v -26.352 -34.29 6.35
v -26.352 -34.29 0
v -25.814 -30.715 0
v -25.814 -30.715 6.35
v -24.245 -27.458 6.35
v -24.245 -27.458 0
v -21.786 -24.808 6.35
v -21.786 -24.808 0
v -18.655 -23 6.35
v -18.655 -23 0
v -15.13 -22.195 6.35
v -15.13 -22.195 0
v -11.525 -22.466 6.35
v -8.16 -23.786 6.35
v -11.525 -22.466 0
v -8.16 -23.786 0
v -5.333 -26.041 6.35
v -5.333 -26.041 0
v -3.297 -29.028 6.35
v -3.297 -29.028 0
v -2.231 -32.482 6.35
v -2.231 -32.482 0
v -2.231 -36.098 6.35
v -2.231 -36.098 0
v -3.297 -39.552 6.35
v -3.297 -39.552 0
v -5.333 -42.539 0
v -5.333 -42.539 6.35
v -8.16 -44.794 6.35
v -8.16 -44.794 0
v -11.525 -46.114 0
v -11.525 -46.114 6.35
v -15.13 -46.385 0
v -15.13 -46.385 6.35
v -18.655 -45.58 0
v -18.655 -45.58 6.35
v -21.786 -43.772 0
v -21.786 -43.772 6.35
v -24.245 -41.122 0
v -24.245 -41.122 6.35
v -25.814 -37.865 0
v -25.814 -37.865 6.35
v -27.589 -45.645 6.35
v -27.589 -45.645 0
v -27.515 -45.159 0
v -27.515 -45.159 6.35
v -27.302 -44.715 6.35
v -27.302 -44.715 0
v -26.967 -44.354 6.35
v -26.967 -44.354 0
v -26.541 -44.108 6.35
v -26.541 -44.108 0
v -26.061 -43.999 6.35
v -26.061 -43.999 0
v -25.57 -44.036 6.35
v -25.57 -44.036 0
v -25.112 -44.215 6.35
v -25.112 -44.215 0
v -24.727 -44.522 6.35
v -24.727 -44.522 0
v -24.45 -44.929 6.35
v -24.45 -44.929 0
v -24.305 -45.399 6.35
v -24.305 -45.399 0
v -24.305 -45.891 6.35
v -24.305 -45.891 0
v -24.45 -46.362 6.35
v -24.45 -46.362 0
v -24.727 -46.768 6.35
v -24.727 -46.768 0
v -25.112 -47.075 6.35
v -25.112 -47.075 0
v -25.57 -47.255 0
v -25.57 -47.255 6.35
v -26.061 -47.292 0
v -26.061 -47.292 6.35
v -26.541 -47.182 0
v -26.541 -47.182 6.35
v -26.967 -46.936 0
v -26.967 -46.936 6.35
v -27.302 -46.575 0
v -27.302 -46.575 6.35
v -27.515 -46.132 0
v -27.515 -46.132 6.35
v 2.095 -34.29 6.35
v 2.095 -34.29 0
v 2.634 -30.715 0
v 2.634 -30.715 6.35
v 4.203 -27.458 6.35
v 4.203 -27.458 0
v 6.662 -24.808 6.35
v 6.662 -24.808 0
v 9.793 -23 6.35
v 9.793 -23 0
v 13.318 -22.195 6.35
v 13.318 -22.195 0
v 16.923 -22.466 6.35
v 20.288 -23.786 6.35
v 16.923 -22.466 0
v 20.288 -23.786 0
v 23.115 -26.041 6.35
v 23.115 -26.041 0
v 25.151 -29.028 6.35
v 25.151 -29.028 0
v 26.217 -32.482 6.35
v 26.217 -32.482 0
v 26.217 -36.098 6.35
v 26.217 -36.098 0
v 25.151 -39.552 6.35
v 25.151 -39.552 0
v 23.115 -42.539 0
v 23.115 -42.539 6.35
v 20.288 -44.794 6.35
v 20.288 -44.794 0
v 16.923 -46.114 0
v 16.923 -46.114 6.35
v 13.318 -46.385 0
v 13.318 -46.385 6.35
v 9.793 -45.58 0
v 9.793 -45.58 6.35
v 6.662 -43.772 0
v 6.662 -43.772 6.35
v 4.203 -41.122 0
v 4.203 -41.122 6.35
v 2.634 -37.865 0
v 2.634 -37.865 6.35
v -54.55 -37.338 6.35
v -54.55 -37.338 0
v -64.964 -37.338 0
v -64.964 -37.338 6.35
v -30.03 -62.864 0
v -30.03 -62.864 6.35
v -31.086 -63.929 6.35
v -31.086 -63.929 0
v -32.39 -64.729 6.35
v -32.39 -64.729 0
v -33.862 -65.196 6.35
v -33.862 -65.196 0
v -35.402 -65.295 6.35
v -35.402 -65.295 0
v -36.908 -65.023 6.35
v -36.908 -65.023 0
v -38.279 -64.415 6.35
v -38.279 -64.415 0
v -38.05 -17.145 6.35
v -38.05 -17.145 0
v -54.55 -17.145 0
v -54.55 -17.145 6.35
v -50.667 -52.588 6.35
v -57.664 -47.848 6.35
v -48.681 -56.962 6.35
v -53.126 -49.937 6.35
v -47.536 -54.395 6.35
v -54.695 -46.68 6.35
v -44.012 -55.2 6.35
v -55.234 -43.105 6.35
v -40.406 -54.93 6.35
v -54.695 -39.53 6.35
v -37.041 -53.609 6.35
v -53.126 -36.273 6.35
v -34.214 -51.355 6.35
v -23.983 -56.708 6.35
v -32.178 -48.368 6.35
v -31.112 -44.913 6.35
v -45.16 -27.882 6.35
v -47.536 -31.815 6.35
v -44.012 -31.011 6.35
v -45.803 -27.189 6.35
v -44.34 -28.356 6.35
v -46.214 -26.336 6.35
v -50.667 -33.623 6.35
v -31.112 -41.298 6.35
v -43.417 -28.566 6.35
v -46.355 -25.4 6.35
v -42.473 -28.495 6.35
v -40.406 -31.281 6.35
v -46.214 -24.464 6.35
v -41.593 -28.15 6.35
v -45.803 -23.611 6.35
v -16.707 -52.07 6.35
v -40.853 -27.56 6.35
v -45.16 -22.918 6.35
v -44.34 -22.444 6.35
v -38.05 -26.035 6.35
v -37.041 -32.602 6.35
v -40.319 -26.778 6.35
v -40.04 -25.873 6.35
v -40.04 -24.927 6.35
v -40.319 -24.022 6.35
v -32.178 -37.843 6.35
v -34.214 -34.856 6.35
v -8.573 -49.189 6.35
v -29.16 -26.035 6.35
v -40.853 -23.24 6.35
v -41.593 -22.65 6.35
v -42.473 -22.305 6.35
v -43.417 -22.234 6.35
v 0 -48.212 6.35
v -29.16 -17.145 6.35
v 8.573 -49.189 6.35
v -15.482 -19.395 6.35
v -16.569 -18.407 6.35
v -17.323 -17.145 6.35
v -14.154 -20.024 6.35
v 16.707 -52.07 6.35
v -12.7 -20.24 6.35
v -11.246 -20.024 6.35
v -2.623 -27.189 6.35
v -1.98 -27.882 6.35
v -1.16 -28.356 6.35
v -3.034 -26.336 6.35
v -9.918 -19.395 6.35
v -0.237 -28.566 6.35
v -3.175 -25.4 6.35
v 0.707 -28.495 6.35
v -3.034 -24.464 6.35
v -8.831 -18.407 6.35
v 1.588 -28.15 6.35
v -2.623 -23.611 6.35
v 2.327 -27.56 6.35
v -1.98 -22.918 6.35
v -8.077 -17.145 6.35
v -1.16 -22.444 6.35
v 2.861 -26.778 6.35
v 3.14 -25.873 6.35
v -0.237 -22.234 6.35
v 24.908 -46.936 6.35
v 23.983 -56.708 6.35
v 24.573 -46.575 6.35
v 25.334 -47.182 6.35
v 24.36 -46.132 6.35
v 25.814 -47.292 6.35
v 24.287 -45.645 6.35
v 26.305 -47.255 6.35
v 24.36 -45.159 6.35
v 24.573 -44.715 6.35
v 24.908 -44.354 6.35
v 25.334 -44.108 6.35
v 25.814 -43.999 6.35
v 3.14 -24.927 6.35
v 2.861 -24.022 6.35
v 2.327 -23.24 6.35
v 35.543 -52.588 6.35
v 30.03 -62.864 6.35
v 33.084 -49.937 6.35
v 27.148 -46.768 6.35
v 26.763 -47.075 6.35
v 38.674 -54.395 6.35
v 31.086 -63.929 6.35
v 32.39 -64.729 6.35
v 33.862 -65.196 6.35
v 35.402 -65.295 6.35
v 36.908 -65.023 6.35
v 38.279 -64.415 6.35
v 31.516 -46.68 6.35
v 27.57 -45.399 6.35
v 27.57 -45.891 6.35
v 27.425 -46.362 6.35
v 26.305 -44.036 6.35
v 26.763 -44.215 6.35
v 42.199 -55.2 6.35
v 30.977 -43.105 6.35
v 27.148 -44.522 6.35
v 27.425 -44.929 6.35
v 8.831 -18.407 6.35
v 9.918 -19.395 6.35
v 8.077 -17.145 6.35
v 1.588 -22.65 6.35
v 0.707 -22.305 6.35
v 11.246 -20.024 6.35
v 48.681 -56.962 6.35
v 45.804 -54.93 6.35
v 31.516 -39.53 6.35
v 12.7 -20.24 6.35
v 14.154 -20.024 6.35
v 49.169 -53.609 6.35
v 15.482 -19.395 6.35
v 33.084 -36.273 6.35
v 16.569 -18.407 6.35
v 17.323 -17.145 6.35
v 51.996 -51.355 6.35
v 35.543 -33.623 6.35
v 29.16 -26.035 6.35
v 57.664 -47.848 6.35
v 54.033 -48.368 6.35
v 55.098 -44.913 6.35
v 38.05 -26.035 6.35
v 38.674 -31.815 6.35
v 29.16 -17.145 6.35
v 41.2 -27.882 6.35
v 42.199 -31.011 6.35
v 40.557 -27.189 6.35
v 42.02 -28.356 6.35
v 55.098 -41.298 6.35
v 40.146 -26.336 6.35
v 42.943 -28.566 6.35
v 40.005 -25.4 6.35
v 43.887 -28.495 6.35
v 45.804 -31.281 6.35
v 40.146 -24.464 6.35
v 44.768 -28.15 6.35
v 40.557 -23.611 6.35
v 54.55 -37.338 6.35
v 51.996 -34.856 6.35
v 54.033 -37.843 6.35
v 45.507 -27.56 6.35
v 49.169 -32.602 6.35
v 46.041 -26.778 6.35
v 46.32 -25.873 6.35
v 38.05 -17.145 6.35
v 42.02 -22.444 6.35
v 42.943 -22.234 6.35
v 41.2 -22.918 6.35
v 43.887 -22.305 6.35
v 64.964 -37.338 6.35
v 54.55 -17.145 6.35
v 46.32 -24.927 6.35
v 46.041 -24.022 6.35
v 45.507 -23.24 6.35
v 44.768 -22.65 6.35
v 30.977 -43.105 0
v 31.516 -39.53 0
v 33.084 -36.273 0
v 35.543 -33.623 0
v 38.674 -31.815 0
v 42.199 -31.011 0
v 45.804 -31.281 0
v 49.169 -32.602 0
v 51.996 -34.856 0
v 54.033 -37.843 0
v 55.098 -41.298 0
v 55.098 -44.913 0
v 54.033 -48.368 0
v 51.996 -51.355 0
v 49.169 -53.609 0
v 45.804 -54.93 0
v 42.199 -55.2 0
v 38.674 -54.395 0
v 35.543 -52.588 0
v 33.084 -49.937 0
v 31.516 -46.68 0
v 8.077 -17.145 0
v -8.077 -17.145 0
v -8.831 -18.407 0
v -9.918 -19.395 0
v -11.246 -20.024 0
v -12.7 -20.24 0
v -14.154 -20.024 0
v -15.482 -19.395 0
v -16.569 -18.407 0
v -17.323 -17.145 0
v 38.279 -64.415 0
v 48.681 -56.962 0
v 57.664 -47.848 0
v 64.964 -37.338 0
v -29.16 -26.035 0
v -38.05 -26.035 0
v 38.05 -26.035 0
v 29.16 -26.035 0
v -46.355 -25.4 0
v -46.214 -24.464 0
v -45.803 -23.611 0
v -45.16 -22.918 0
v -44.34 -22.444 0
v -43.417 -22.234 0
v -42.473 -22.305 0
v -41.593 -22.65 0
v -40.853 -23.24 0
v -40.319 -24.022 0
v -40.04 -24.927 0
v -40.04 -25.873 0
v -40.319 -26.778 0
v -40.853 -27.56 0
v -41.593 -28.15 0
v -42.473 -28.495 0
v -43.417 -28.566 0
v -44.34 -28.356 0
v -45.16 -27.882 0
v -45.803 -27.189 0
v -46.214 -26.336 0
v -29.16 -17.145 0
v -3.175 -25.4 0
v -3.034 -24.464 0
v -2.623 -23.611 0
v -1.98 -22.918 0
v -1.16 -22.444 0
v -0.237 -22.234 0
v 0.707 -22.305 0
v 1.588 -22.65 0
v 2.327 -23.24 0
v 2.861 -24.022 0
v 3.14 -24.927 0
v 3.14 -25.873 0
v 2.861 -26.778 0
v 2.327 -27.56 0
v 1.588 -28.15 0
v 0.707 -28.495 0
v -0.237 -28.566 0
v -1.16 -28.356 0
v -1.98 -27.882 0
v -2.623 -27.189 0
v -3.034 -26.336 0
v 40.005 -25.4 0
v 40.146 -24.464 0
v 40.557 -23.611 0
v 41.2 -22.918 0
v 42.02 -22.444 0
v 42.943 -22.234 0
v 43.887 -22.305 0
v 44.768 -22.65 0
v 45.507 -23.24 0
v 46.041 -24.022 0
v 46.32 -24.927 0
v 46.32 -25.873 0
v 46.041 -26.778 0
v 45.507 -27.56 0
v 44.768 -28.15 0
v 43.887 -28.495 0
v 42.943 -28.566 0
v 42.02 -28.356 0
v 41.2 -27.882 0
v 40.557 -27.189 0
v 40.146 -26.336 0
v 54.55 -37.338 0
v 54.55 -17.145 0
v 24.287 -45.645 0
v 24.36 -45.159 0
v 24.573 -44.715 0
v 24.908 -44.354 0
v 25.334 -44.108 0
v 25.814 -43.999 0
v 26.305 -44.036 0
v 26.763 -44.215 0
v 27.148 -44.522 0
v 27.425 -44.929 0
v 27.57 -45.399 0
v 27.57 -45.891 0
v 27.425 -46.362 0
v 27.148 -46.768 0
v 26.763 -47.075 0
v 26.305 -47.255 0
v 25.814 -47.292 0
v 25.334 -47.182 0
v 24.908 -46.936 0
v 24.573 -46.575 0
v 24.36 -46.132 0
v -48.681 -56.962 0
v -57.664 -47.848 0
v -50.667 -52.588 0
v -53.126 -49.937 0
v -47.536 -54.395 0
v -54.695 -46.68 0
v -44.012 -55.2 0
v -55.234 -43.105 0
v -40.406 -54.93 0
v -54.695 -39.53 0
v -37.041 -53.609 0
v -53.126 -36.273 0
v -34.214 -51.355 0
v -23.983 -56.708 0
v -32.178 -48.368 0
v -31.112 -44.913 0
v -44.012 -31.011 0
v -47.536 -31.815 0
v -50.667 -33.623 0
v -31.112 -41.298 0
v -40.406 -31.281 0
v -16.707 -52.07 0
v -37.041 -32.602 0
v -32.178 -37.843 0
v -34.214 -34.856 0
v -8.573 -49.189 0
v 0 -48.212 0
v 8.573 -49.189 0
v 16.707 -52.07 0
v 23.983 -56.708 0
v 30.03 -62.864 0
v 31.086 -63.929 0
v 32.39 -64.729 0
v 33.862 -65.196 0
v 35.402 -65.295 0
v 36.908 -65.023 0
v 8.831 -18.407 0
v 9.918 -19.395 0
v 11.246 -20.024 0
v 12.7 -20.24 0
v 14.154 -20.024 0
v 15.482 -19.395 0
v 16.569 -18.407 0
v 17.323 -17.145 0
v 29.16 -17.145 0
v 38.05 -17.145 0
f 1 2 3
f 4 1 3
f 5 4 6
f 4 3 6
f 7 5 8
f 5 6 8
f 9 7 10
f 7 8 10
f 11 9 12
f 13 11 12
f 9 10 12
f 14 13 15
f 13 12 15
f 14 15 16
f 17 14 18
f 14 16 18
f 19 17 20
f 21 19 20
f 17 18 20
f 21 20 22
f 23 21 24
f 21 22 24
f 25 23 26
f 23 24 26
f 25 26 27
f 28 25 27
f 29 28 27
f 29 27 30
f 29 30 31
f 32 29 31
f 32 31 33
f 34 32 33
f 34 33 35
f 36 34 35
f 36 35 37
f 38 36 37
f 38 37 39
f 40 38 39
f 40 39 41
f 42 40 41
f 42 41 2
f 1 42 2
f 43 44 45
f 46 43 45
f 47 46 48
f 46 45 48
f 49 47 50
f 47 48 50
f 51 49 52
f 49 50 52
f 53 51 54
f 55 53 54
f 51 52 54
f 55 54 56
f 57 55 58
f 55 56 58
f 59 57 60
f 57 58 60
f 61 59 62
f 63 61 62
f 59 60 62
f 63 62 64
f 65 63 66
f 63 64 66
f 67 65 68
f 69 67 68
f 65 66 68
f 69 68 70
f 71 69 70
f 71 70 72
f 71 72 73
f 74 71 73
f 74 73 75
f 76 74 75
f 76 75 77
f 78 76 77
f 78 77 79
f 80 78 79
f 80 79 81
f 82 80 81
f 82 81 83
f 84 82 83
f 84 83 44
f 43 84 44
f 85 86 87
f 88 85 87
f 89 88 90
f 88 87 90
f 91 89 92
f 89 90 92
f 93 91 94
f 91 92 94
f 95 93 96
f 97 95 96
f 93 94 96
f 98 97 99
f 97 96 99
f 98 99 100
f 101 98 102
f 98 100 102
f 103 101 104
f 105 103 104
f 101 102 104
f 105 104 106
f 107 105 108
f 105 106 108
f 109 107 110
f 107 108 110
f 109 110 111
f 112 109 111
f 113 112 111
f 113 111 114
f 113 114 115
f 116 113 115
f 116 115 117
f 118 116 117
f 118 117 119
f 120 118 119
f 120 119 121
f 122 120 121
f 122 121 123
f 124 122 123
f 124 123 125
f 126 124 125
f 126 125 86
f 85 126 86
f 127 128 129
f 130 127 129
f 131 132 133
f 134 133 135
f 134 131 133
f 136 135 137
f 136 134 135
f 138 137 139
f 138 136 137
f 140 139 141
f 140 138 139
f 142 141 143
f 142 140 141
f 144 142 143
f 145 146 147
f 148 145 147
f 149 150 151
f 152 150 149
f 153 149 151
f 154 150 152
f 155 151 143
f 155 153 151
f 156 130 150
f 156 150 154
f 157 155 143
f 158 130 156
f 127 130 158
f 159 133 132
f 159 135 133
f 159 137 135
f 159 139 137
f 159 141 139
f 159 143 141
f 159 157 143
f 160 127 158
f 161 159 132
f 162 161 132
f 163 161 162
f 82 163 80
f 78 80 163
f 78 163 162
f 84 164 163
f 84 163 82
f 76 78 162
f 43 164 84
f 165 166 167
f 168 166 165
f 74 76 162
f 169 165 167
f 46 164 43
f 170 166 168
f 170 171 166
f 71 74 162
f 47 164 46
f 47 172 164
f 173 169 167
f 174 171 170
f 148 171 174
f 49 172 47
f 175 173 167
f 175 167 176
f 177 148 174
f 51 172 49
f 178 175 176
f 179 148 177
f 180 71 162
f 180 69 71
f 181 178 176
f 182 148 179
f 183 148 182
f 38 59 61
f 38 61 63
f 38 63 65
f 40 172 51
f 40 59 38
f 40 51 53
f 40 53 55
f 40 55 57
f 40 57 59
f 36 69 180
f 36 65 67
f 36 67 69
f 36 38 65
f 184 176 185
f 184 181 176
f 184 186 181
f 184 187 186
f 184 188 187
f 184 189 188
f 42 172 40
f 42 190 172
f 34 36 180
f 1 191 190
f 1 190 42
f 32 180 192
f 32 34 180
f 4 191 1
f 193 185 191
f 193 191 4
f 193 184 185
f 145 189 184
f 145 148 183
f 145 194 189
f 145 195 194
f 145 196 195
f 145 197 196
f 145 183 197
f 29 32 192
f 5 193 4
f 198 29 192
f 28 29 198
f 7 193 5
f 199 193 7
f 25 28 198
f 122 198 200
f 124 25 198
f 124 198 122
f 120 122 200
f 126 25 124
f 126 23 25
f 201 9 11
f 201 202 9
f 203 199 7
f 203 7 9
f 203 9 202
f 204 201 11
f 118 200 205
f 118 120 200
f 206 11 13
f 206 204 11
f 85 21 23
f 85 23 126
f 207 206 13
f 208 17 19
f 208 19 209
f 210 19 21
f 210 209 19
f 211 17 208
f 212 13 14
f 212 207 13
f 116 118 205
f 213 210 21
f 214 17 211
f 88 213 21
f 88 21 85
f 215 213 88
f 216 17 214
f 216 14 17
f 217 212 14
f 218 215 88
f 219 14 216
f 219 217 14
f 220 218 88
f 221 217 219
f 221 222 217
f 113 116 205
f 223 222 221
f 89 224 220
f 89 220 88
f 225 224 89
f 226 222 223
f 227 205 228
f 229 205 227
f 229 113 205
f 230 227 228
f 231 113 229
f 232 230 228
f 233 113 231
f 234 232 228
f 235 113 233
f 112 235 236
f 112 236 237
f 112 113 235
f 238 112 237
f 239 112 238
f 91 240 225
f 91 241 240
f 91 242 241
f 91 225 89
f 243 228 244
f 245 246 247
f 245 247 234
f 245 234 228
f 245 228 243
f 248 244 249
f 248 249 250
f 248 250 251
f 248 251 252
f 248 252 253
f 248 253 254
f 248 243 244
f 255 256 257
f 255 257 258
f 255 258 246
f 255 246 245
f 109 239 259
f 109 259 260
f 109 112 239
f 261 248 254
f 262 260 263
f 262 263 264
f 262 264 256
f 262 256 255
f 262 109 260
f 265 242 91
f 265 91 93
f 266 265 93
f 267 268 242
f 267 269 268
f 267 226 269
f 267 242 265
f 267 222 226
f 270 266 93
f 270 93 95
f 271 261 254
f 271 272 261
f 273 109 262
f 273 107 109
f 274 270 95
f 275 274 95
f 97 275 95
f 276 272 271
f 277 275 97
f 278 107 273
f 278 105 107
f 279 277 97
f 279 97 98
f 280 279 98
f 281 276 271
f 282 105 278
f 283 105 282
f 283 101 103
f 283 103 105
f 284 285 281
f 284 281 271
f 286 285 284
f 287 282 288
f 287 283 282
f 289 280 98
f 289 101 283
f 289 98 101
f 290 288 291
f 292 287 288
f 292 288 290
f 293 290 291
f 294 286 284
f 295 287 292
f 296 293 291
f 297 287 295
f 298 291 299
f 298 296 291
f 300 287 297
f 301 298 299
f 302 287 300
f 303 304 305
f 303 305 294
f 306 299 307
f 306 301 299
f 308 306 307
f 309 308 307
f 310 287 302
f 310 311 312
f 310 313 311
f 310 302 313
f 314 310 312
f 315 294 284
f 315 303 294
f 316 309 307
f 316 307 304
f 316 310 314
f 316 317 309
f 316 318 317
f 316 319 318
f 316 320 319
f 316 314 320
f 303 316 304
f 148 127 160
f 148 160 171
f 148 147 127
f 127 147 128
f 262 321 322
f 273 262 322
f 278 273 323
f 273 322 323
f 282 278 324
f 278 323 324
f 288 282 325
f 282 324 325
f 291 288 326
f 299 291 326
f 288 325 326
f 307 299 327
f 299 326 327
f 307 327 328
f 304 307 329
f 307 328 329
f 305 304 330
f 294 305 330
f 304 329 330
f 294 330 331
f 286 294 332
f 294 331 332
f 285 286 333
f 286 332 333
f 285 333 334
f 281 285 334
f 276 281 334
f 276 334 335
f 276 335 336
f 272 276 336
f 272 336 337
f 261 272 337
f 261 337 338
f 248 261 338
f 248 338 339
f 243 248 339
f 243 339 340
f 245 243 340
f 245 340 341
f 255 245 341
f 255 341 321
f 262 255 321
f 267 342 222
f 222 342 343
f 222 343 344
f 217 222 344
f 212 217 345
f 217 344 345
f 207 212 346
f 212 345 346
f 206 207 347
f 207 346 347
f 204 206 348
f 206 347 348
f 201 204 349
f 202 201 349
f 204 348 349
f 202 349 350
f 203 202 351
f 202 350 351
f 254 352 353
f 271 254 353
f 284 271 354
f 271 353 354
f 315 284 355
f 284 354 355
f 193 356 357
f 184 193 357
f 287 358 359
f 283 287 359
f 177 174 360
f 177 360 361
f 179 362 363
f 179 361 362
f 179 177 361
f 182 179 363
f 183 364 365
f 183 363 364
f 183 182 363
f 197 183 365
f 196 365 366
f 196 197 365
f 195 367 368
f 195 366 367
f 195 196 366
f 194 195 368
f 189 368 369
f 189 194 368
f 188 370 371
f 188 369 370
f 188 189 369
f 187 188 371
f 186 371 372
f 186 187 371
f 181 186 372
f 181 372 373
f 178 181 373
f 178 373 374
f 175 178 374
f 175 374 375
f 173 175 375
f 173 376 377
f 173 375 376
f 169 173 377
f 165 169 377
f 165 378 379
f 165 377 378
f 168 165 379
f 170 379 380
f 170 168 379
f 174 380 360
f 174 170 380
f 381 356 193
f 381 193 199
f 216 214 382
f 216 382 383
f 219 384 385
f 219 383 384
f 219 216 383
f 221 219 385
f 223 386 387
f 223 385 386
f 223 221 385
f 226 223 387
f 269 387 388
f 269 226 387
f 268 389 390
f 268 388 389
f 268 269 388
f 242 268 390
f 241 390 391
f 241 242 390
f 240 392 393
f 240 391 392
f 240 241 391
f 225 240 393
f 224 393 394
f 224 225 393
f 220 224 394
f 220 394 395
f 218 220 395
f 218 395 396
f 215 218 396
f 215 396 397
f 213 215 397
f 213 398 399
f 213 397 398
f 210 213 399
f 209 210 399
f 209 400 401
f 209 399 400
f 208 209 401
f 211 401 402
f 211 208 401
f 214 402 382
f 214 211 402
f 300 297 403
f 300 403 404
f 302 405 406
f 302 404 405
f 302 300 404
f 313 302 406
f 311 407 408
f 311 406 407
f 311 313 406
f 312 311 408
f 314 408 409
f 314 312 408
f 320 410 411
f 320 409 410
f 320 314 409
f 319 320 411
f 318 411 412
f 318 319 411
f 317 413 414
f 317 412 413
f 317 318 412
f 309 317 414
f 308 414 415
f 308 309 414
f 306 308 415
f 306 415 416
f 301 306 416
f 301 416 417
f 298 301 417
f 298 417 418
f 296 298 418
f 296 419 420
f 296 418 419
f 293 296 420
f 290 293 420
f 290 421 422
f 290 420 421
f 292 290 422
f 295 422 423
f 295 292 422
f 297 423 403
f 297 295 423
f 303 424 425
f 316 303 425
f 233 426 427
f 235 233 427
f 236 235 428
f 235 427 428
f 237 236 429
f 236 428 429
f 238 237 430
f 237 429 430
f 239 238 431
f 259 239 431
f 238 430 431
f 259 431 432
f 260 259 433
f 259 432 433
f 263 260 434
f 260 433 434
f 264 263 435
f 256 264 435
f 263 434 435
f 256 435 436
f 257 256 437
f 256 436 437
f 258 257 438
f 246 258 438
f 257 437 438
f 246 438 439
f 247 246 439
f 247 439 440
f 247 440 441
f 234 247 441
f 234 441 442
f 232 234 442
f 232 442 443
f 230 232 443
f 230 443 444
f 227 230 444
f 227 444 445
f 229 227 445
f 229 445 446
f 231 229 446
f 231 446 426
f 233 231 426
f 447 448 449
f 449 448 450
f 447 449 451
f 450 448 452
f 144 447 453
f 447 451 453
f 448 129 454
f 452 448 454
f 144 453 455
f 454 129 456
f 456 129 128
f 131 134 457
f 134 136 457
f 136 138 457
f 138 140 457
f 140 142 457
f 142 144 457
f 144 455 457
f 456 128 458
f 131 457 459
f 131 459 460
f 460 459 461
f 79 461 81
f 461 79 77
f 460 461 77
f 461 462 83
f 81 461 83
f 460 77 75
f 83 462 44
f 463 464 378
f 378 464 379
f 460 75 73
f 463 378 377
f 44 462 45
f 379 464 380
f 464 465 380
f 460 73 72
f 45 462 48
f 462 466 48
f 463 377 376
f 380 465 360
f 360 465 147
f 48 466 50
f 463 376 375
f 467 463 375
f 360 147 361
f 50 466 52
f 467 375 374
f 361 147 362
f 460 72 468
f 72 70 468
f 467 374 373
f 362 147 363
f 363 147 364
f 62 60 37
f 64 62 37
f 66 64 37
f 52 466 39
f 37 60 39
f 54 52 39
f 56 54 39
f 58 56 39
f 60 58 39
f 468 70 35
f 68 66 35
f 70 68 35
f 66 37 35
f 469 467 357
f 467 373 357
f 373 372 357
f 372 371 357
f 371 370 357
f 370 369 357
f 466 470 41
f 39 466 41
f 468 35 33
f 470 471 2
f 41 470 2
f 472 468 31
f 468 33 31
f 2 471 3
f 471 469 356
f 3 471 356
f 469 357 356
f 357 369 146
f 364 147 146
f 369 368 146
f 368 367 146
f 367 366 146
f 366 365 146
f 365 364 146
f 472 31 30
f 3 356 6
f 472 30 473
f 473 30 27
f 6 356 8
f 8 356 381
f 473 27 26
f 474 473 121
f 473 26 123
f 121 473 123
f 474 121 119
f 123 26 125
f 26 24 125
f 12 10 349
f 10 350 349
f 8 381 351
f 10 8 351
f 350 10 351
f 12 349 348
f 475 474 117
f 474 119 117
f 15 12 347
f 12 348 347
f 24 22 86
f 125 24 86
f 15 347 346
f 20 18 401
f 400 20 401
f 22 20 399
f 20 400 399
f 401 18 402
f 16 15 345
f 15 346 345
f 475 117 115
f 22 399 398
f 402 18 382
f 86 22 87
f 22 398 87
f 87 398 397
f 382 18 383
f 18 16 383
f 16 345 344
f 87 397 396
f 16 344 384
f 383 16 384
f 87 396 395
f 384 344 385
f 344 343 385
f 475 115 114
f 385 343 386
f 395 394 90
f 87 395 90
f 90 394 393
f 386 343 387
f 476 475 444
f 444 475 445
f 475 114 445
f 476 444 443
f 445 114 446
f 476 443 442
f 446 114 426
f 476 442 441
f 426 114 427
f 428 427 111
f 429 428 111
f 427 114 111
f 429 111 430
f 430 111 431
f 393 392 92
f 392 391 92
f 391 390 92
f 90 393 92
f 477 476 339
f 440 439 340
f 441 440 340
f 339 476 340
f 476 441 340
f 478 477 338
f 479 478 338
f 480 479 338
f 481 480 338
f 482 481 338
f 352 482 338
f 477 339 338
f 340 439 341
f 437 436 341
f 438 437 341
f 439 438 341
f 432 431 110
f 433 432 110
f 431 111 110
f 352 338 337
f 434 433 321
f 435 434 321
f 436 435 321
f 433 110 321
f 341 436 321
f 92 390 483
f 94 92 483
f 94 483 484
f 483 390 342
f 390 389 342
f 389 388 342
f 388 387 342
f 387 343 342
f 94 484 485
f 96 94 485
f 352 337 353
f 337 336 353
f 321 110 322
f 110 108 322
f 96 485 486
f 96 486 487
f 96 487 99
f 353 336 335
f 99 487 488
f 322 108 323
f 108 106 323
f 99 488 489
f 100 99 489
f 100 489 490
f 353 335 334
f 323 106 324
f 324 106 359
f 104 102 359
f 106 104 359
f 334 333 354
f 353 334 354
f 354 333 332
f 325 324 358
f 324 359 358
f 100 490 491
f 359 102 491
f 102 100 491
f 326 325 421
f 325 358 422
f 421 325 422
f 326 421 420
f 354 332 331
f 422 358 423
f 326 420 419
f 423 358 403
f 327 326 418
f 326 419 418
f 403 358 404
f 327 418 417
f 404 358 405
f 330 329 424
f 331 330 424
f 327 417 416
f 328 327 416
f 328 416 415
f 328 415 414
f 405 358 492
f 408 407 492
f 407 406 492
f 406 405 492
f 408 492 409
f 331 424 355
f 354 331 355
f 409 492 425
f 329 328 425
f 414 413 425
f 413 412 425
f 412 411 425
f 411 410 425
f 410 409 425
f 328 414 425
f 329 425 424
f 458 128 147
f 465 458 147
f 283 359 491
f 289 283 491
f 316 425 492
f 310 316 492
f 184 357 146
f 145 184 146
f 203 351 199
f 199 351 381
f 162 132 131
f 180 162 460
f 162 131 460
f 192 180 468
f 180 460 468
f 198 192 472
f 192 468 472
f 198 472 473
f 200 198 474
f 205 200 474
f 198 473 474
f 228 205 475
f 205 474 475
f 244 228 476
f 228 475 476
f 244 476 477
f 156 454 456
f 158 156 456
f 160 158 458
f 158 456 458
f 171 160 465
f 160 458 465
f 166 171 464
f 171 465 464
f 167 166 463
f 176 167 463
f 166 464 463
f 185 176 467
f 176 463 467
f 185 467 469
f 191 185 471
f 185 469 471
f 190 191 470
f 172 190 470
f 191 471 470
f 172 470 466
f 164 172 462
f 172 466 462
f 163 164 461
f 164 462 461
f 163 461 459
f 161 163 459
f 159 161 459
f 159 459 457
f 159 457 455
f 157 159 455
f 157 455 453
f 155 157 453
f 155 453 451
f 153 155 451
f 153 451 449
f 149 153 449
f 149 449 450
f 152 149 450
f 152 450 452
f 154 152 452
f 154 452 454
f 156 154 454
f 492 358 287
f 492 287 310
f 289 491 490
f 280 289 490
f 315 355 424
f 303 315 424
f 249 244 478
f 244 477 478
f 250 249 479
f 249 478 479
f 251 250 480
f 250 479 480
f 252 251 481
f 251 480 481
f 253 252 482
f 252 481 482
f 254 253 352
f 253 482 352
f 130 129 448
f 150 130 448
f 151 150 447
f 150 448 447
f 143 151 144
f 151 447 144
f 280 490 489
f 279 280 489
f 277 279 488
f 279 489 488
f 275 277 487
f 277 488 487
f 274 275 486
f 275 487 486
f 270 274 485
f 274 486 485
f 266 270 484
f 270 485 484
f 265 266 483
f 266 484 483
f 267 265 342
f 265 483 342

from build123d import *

# Parameters (mm, degrees)
SKETCH1_R                 = 1.651
BOSS_EXTRUDE2_DEPTH       = 6.35
SKETCH2_R                 = 1.143
CUT_EXTRUDE1_DEPTH        = 7.35
SKETCH3_R                 = 12.1285
CUT_EXTRUDE2_DEPTH        = 7.35
SKETCH4_W                 = 28.562713242
SKETCH4_H                 = 11.677503754
BOSS_EXTRUDE3_DEPTH       = 6.35
SKETCH5_W                 = 216.7214489
SKETCH5_H                 = 130.569220634
CUT_EXTRUDE4_DEPTH        = 7.35
SKETCH6_R                 = 38.1
CUT_EXTRUDE5_DEPTH        = 60.96
FILLET1_R                 = 6.35
FILLET2_R                 = 6.35
SKETCH102_W               = 8.89
SKETCH102_H               = 8.89
CUT_EXTRUDE101_DEPTH      = 7.3500001
SKETCH105_R               = 5
CUT_EXTRUDE104_DEPTH      = 10
SKETCH106_R               = 3.175
CUT_EXTRUDE105_DEPTH      = 103.378
CUT_EXTRUDE105_DEPTH_BACK = 1
SKETCH158_R               = 1.651
CUT_EXTRUDE157_DEPTH      = 97.79


with BuildPart() as part:
    # Sketch1 → Boss-Extrude2 (new body)
    with BuildSketch(Plane.XY):
        with BuildLine():
            Line((-64.964441474, 37.338), (-54.550441474, 37.338))
            Line((-54.550441474, 37.338), (-54.550441474, -37.338))
            Line((-54.550441474, -37.338), (-64.964441474, -37.338))
            ThreePointArc((-64.964441474, -37.338), (0, -74.93), (64.964441474, -37.338))
            Line((64.964441474, -37.338), (54.550441474, -37.338))
            Line((54.550441474, -37.338), (54.550441474, 37.338))
            Line((54.550441474, 37.338), (64.964441474, 37.338))
            ThreePointArc((64.964441474, 37.338), (0, 74.93), (-64.964441474, 37.338))
        make_face()
        with Locations((-46.482, 11.049)):
            Circle(SKETCH1_R, mode=Mode.SUBTRACT)
        with Locations((-21.083270032, 10.795)):
            Circle(SKETCH1_R, mode=Mode.SUBTRACT)
        with Locations((-21.083270032, -10.795)):
            Circle(SKETCH1_R, mode=Mode.SUBTRACT)
        with Locations((-46.482, -11.049)):
            Circle(SKETCH1_R, mode=Mode.SUBTRACT)
        with Locations((46.482, -11.049)):
            Circle(SKETCH1_R, mode=Mode.SUBTRACT)
        with Locations((21.083270032, -10.795)):
            Circle(SKETCH1_R, mode=Mode.SUBTRACT)
        with Locations((21.083270032, 10.795)):
            Circle(SKETCH1_R, mode=Mode.SUBTRACT)
        with Locations((46.482, 11.049)):
            Circle(SKETCH1_R, mode=Mode.SUBTRACT)
    extrude(amount=BOSS_EXTRUDE2_DEPTH)

    # Sketch2 → Cut-Extrude1 (cut, through all)
    with BuildSketch(Plane.XY.offset(6.35)):
        with Locations((-6.731, 62.23)):
            Circle(SKETCH2_R)
        with Locations((6.731, 62.23)):
            Circle(SKETCH2_R)
    extrude(amount=-CUT_EXTRUDE1_DEPTH, mode=Mode.SUBTRACT)

    # Sketch3 → Cut-Extrude2 (cut, through all)
    with BuildSketch(Plane(origin=(0, 0, 0), x_dir=(-1, 0, 0), z_dir=(0, 0, -1))):
        with Locations((-43.105229381, -43.105229381)):
            Circle(SKETCH3_R)
        with Locations((14.224, -34.29)):
            Circle(SKETCH3_R)
        with Locations((14.224, 34.29)):
            Circle(SKETCH3_R)
        with Locations((-43.105229381, 43.105229381)):
            Circle(SKETCH3_R)
        with Locations((43.105229381, 43.105229381)):
            Circle(SKETCH3_R)
        with Locations((-14.224, 34.29)):
            Circle(SKETCH3_R)
        with Locations((-14.224, -34.29)):
            Circle(SKETCH3_R)
        with Locations((43.105229381, -43.105229381)):
            Circle(SKETCH3_R)
    extrude(amount=-CUT_EXTRUDE2_DEPTH, mode=Mode.SUBTRACT)

    # Sketch4 → Boss-Extrude3 (add)
    with BuildSketch(Plane(origin=(0, 0, 0), x_dir=(-1, 0, 0), z_dir=(0, 0, -1))):
        with Locations((-1.488809975, 62.152540216)):
            Rectangle(SKETCH4_W, SKETCH4_H)
    extrude(amount=-BOSS_EXTRUDE3_DEPTH)

    # Sketch5 → Cut-Extrude4 (cut, through all)
    with BuildSketch(Plane(origin=(0, 0, 0), x_dir=(-1, 0, 0), z_dir=(0, 0, -1))):
        with Locations((23.316688373, 48.139610317)):
            Rectangle(SKETCH5_W, SKETCH5_H)
    extrude(amount=-CUT_EXTRUDE4_DEPTH, mode=Mode.SUBTRACT)

    # Sketch6 → Cut-Extrude5 (cut)
    with BuildSketch(Plane(origin=(0, 0, 0), x_dir=(-1, 0, 0), z_dir=(0, 0, -1))):
        with Locations((0, -86.312058398)):
            Circle(SKETCH6_R)
    extrude(amount=-CUT_EXTRUDE5_DEPTH, mode=Mode.SUBTRACT)

    # Fillet1
    fillet1_edges = [part.edges().sort_by_distance(p)[0] for p in [
        (-33.000960548, -67.271401821, 3.175),
    ]]
    fillet(fillet1_edges, radius=FILLET1_R)

    # Fillet2
    fillet2_edges = [part.edges().sort_by_distance(p)[0] for p in [
        (33.000960548, -67.271401821, 3.175),
    ]]
    fillet(fillet2_edges, radius=FILLET2_R)

    # Sketch102 → Cut-Extrude101 (cut, through all)
    with BuildSketch(Plane(origin=(0, 0, 0), x_dir=(-1, 0, 0), z_dir=(0, 0, -1))):
        with Locations((-33.605441474, -21.59)):
            Rectangle(SKETCH102_W, SKETCH102_H)
        with Locations((33.605441474, -21.59)):
            Rectangle(SKETCH102_W, SKETCH102_H)
    extrude(amount=-CUT_EXTRUDE101_DEPTH, mode=Mode.SUBTRACT)

    # Sketch105 → Cut-Extrude104 (cut)
    with BuildSketch(Plane(origin=(0, 0, 0), x_dir=(-1, 0, 0), z_dir=(0, 0, -1))):
        with Locations((-12.7, -15.24)):
            Circle(SKETCH105_R)
        with Locations((12.7, -15.24)):
            Circle(SKETCH105_R)
    extrude(amount=-CUT_EXTRUDE104_DEPTH, mode=Mode.SUBTRACT)

    # Sketch106 → Cut-Extrude105 (cut, two sides)
    with BuildSketch(Plane(origin=(30.092005081, 4.08352975, 25.4), x_dir=(-1, 0, 0), z_dir=(0, 0, -1))) as cut_extrude105_sk:
        with Locations((73.272005081, -29.48352975)):
            Circle(SKETCH106_R)
        with Locations((30.092005081, -29.48352975)):
            Circle(SKETCH106_R)
        with Locations((-13.087994919, -29.48352975)):
            Circle(SKETCH106_R)
    extrude(amount=CUT_EXTRUDE105_DEPTH, mode=Mode.SUBTRACT)
    extrude(cut_extrude105_sk.sketch, amount=-CUT_EXTRUDE105_DEPTH_BACK, mode=Mode.SUBTRACT)

    # Sketch158 → Cut-Extrude157 (cut)
    with BuildSketch(Plane(origin=(30.092005081, 4.08352975, -22.225), x_dir=(-1, 0, 0), z_dir=(0, 0, -1))):
        with Locations((4.154396091, -49.728759131)):
            Circle(SKETCH158_R)
        with Locations((56.02961407, -49.728759131)):
            Circle(SKETCH158_R)
    extrude(amount=-CUT_EXTRUDE157_DEPTH, mode=Mode.SUBTRACT)


solid = part.part
